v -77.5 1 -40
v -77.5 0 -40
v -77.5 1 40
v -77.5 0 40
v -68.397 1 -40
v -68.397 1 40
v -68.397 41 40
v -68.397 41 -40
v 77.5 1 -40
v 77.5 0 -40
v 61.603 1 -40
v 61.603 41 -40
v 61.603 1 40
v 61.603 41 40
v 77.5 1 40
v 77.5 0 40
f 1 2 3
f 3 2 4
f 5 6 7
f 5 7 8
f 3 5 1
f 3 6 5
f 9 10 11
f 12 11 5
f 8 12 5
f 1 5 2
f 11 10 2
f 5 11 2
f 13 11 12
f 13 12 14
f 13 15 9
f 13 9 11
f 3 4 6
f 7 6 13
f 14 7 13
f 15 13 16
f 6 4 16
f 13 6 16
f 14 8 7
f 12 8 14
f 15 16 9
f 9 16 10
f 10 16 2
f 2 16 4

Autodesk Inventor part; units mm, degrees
ref_plane "YZ Plane" through (0, 0, 0) normal (1, 0, 0) x (0, 1, 0)
ref_plane "XZ Plane" through (0, 0, 0) normal (0, 1, 0) x (-1, 0, 0)
ref_plane "XY Plane" through (0, 0, 0) normal (0, 0, 1) x (1, 0, 0)
sketch "Sketch1" plane through (0, 0, 0) normal (0, 1, 0) x (-1, 0, 0)
  line L0 (77.5, 40) -> (-77.5, 40)
  line L1 (-77.5, 40) -> (-77.5, -40)
  line L2 (-77.5, -40) -> (77.5, -40)
  line L3 (77.5, -40) -> (77.5, 40)
  point P0 (0, 0)
  point P1 (0, -40)
  point P2 (77.5, 0)
  dimension "d0" = 155
  dimension "d1" = 80
extrude "Extrusion1" add sketch "Sketch1" along normal blind 1
sketch "Sketch3" plane through (0, 1, 0) normal (0, 1, 0) x (1, 0, 0)
  line L0 (77.5, 40) -> (-77.5, 40) projected
  line L1 (-77.5, -40) -> (77.5, -40) projected
  line L2 (-68.3973, 40) -> (61.6027, 40)
  line L3 (61.6027, 40) -> (61.6027, -40)
  line L4 (61.6027, -40) -> (-68.3973, -40)
  line L5 (-68.3973, -40) -> (-68.3973, 40)
  point P0 (0, 0)
  point P1 (0, 40)
  dimension "d7" = 130
extrude "Extrusion2" add sketch "Sketch3" along normal blind 40
properties part number "sound amplifier"
